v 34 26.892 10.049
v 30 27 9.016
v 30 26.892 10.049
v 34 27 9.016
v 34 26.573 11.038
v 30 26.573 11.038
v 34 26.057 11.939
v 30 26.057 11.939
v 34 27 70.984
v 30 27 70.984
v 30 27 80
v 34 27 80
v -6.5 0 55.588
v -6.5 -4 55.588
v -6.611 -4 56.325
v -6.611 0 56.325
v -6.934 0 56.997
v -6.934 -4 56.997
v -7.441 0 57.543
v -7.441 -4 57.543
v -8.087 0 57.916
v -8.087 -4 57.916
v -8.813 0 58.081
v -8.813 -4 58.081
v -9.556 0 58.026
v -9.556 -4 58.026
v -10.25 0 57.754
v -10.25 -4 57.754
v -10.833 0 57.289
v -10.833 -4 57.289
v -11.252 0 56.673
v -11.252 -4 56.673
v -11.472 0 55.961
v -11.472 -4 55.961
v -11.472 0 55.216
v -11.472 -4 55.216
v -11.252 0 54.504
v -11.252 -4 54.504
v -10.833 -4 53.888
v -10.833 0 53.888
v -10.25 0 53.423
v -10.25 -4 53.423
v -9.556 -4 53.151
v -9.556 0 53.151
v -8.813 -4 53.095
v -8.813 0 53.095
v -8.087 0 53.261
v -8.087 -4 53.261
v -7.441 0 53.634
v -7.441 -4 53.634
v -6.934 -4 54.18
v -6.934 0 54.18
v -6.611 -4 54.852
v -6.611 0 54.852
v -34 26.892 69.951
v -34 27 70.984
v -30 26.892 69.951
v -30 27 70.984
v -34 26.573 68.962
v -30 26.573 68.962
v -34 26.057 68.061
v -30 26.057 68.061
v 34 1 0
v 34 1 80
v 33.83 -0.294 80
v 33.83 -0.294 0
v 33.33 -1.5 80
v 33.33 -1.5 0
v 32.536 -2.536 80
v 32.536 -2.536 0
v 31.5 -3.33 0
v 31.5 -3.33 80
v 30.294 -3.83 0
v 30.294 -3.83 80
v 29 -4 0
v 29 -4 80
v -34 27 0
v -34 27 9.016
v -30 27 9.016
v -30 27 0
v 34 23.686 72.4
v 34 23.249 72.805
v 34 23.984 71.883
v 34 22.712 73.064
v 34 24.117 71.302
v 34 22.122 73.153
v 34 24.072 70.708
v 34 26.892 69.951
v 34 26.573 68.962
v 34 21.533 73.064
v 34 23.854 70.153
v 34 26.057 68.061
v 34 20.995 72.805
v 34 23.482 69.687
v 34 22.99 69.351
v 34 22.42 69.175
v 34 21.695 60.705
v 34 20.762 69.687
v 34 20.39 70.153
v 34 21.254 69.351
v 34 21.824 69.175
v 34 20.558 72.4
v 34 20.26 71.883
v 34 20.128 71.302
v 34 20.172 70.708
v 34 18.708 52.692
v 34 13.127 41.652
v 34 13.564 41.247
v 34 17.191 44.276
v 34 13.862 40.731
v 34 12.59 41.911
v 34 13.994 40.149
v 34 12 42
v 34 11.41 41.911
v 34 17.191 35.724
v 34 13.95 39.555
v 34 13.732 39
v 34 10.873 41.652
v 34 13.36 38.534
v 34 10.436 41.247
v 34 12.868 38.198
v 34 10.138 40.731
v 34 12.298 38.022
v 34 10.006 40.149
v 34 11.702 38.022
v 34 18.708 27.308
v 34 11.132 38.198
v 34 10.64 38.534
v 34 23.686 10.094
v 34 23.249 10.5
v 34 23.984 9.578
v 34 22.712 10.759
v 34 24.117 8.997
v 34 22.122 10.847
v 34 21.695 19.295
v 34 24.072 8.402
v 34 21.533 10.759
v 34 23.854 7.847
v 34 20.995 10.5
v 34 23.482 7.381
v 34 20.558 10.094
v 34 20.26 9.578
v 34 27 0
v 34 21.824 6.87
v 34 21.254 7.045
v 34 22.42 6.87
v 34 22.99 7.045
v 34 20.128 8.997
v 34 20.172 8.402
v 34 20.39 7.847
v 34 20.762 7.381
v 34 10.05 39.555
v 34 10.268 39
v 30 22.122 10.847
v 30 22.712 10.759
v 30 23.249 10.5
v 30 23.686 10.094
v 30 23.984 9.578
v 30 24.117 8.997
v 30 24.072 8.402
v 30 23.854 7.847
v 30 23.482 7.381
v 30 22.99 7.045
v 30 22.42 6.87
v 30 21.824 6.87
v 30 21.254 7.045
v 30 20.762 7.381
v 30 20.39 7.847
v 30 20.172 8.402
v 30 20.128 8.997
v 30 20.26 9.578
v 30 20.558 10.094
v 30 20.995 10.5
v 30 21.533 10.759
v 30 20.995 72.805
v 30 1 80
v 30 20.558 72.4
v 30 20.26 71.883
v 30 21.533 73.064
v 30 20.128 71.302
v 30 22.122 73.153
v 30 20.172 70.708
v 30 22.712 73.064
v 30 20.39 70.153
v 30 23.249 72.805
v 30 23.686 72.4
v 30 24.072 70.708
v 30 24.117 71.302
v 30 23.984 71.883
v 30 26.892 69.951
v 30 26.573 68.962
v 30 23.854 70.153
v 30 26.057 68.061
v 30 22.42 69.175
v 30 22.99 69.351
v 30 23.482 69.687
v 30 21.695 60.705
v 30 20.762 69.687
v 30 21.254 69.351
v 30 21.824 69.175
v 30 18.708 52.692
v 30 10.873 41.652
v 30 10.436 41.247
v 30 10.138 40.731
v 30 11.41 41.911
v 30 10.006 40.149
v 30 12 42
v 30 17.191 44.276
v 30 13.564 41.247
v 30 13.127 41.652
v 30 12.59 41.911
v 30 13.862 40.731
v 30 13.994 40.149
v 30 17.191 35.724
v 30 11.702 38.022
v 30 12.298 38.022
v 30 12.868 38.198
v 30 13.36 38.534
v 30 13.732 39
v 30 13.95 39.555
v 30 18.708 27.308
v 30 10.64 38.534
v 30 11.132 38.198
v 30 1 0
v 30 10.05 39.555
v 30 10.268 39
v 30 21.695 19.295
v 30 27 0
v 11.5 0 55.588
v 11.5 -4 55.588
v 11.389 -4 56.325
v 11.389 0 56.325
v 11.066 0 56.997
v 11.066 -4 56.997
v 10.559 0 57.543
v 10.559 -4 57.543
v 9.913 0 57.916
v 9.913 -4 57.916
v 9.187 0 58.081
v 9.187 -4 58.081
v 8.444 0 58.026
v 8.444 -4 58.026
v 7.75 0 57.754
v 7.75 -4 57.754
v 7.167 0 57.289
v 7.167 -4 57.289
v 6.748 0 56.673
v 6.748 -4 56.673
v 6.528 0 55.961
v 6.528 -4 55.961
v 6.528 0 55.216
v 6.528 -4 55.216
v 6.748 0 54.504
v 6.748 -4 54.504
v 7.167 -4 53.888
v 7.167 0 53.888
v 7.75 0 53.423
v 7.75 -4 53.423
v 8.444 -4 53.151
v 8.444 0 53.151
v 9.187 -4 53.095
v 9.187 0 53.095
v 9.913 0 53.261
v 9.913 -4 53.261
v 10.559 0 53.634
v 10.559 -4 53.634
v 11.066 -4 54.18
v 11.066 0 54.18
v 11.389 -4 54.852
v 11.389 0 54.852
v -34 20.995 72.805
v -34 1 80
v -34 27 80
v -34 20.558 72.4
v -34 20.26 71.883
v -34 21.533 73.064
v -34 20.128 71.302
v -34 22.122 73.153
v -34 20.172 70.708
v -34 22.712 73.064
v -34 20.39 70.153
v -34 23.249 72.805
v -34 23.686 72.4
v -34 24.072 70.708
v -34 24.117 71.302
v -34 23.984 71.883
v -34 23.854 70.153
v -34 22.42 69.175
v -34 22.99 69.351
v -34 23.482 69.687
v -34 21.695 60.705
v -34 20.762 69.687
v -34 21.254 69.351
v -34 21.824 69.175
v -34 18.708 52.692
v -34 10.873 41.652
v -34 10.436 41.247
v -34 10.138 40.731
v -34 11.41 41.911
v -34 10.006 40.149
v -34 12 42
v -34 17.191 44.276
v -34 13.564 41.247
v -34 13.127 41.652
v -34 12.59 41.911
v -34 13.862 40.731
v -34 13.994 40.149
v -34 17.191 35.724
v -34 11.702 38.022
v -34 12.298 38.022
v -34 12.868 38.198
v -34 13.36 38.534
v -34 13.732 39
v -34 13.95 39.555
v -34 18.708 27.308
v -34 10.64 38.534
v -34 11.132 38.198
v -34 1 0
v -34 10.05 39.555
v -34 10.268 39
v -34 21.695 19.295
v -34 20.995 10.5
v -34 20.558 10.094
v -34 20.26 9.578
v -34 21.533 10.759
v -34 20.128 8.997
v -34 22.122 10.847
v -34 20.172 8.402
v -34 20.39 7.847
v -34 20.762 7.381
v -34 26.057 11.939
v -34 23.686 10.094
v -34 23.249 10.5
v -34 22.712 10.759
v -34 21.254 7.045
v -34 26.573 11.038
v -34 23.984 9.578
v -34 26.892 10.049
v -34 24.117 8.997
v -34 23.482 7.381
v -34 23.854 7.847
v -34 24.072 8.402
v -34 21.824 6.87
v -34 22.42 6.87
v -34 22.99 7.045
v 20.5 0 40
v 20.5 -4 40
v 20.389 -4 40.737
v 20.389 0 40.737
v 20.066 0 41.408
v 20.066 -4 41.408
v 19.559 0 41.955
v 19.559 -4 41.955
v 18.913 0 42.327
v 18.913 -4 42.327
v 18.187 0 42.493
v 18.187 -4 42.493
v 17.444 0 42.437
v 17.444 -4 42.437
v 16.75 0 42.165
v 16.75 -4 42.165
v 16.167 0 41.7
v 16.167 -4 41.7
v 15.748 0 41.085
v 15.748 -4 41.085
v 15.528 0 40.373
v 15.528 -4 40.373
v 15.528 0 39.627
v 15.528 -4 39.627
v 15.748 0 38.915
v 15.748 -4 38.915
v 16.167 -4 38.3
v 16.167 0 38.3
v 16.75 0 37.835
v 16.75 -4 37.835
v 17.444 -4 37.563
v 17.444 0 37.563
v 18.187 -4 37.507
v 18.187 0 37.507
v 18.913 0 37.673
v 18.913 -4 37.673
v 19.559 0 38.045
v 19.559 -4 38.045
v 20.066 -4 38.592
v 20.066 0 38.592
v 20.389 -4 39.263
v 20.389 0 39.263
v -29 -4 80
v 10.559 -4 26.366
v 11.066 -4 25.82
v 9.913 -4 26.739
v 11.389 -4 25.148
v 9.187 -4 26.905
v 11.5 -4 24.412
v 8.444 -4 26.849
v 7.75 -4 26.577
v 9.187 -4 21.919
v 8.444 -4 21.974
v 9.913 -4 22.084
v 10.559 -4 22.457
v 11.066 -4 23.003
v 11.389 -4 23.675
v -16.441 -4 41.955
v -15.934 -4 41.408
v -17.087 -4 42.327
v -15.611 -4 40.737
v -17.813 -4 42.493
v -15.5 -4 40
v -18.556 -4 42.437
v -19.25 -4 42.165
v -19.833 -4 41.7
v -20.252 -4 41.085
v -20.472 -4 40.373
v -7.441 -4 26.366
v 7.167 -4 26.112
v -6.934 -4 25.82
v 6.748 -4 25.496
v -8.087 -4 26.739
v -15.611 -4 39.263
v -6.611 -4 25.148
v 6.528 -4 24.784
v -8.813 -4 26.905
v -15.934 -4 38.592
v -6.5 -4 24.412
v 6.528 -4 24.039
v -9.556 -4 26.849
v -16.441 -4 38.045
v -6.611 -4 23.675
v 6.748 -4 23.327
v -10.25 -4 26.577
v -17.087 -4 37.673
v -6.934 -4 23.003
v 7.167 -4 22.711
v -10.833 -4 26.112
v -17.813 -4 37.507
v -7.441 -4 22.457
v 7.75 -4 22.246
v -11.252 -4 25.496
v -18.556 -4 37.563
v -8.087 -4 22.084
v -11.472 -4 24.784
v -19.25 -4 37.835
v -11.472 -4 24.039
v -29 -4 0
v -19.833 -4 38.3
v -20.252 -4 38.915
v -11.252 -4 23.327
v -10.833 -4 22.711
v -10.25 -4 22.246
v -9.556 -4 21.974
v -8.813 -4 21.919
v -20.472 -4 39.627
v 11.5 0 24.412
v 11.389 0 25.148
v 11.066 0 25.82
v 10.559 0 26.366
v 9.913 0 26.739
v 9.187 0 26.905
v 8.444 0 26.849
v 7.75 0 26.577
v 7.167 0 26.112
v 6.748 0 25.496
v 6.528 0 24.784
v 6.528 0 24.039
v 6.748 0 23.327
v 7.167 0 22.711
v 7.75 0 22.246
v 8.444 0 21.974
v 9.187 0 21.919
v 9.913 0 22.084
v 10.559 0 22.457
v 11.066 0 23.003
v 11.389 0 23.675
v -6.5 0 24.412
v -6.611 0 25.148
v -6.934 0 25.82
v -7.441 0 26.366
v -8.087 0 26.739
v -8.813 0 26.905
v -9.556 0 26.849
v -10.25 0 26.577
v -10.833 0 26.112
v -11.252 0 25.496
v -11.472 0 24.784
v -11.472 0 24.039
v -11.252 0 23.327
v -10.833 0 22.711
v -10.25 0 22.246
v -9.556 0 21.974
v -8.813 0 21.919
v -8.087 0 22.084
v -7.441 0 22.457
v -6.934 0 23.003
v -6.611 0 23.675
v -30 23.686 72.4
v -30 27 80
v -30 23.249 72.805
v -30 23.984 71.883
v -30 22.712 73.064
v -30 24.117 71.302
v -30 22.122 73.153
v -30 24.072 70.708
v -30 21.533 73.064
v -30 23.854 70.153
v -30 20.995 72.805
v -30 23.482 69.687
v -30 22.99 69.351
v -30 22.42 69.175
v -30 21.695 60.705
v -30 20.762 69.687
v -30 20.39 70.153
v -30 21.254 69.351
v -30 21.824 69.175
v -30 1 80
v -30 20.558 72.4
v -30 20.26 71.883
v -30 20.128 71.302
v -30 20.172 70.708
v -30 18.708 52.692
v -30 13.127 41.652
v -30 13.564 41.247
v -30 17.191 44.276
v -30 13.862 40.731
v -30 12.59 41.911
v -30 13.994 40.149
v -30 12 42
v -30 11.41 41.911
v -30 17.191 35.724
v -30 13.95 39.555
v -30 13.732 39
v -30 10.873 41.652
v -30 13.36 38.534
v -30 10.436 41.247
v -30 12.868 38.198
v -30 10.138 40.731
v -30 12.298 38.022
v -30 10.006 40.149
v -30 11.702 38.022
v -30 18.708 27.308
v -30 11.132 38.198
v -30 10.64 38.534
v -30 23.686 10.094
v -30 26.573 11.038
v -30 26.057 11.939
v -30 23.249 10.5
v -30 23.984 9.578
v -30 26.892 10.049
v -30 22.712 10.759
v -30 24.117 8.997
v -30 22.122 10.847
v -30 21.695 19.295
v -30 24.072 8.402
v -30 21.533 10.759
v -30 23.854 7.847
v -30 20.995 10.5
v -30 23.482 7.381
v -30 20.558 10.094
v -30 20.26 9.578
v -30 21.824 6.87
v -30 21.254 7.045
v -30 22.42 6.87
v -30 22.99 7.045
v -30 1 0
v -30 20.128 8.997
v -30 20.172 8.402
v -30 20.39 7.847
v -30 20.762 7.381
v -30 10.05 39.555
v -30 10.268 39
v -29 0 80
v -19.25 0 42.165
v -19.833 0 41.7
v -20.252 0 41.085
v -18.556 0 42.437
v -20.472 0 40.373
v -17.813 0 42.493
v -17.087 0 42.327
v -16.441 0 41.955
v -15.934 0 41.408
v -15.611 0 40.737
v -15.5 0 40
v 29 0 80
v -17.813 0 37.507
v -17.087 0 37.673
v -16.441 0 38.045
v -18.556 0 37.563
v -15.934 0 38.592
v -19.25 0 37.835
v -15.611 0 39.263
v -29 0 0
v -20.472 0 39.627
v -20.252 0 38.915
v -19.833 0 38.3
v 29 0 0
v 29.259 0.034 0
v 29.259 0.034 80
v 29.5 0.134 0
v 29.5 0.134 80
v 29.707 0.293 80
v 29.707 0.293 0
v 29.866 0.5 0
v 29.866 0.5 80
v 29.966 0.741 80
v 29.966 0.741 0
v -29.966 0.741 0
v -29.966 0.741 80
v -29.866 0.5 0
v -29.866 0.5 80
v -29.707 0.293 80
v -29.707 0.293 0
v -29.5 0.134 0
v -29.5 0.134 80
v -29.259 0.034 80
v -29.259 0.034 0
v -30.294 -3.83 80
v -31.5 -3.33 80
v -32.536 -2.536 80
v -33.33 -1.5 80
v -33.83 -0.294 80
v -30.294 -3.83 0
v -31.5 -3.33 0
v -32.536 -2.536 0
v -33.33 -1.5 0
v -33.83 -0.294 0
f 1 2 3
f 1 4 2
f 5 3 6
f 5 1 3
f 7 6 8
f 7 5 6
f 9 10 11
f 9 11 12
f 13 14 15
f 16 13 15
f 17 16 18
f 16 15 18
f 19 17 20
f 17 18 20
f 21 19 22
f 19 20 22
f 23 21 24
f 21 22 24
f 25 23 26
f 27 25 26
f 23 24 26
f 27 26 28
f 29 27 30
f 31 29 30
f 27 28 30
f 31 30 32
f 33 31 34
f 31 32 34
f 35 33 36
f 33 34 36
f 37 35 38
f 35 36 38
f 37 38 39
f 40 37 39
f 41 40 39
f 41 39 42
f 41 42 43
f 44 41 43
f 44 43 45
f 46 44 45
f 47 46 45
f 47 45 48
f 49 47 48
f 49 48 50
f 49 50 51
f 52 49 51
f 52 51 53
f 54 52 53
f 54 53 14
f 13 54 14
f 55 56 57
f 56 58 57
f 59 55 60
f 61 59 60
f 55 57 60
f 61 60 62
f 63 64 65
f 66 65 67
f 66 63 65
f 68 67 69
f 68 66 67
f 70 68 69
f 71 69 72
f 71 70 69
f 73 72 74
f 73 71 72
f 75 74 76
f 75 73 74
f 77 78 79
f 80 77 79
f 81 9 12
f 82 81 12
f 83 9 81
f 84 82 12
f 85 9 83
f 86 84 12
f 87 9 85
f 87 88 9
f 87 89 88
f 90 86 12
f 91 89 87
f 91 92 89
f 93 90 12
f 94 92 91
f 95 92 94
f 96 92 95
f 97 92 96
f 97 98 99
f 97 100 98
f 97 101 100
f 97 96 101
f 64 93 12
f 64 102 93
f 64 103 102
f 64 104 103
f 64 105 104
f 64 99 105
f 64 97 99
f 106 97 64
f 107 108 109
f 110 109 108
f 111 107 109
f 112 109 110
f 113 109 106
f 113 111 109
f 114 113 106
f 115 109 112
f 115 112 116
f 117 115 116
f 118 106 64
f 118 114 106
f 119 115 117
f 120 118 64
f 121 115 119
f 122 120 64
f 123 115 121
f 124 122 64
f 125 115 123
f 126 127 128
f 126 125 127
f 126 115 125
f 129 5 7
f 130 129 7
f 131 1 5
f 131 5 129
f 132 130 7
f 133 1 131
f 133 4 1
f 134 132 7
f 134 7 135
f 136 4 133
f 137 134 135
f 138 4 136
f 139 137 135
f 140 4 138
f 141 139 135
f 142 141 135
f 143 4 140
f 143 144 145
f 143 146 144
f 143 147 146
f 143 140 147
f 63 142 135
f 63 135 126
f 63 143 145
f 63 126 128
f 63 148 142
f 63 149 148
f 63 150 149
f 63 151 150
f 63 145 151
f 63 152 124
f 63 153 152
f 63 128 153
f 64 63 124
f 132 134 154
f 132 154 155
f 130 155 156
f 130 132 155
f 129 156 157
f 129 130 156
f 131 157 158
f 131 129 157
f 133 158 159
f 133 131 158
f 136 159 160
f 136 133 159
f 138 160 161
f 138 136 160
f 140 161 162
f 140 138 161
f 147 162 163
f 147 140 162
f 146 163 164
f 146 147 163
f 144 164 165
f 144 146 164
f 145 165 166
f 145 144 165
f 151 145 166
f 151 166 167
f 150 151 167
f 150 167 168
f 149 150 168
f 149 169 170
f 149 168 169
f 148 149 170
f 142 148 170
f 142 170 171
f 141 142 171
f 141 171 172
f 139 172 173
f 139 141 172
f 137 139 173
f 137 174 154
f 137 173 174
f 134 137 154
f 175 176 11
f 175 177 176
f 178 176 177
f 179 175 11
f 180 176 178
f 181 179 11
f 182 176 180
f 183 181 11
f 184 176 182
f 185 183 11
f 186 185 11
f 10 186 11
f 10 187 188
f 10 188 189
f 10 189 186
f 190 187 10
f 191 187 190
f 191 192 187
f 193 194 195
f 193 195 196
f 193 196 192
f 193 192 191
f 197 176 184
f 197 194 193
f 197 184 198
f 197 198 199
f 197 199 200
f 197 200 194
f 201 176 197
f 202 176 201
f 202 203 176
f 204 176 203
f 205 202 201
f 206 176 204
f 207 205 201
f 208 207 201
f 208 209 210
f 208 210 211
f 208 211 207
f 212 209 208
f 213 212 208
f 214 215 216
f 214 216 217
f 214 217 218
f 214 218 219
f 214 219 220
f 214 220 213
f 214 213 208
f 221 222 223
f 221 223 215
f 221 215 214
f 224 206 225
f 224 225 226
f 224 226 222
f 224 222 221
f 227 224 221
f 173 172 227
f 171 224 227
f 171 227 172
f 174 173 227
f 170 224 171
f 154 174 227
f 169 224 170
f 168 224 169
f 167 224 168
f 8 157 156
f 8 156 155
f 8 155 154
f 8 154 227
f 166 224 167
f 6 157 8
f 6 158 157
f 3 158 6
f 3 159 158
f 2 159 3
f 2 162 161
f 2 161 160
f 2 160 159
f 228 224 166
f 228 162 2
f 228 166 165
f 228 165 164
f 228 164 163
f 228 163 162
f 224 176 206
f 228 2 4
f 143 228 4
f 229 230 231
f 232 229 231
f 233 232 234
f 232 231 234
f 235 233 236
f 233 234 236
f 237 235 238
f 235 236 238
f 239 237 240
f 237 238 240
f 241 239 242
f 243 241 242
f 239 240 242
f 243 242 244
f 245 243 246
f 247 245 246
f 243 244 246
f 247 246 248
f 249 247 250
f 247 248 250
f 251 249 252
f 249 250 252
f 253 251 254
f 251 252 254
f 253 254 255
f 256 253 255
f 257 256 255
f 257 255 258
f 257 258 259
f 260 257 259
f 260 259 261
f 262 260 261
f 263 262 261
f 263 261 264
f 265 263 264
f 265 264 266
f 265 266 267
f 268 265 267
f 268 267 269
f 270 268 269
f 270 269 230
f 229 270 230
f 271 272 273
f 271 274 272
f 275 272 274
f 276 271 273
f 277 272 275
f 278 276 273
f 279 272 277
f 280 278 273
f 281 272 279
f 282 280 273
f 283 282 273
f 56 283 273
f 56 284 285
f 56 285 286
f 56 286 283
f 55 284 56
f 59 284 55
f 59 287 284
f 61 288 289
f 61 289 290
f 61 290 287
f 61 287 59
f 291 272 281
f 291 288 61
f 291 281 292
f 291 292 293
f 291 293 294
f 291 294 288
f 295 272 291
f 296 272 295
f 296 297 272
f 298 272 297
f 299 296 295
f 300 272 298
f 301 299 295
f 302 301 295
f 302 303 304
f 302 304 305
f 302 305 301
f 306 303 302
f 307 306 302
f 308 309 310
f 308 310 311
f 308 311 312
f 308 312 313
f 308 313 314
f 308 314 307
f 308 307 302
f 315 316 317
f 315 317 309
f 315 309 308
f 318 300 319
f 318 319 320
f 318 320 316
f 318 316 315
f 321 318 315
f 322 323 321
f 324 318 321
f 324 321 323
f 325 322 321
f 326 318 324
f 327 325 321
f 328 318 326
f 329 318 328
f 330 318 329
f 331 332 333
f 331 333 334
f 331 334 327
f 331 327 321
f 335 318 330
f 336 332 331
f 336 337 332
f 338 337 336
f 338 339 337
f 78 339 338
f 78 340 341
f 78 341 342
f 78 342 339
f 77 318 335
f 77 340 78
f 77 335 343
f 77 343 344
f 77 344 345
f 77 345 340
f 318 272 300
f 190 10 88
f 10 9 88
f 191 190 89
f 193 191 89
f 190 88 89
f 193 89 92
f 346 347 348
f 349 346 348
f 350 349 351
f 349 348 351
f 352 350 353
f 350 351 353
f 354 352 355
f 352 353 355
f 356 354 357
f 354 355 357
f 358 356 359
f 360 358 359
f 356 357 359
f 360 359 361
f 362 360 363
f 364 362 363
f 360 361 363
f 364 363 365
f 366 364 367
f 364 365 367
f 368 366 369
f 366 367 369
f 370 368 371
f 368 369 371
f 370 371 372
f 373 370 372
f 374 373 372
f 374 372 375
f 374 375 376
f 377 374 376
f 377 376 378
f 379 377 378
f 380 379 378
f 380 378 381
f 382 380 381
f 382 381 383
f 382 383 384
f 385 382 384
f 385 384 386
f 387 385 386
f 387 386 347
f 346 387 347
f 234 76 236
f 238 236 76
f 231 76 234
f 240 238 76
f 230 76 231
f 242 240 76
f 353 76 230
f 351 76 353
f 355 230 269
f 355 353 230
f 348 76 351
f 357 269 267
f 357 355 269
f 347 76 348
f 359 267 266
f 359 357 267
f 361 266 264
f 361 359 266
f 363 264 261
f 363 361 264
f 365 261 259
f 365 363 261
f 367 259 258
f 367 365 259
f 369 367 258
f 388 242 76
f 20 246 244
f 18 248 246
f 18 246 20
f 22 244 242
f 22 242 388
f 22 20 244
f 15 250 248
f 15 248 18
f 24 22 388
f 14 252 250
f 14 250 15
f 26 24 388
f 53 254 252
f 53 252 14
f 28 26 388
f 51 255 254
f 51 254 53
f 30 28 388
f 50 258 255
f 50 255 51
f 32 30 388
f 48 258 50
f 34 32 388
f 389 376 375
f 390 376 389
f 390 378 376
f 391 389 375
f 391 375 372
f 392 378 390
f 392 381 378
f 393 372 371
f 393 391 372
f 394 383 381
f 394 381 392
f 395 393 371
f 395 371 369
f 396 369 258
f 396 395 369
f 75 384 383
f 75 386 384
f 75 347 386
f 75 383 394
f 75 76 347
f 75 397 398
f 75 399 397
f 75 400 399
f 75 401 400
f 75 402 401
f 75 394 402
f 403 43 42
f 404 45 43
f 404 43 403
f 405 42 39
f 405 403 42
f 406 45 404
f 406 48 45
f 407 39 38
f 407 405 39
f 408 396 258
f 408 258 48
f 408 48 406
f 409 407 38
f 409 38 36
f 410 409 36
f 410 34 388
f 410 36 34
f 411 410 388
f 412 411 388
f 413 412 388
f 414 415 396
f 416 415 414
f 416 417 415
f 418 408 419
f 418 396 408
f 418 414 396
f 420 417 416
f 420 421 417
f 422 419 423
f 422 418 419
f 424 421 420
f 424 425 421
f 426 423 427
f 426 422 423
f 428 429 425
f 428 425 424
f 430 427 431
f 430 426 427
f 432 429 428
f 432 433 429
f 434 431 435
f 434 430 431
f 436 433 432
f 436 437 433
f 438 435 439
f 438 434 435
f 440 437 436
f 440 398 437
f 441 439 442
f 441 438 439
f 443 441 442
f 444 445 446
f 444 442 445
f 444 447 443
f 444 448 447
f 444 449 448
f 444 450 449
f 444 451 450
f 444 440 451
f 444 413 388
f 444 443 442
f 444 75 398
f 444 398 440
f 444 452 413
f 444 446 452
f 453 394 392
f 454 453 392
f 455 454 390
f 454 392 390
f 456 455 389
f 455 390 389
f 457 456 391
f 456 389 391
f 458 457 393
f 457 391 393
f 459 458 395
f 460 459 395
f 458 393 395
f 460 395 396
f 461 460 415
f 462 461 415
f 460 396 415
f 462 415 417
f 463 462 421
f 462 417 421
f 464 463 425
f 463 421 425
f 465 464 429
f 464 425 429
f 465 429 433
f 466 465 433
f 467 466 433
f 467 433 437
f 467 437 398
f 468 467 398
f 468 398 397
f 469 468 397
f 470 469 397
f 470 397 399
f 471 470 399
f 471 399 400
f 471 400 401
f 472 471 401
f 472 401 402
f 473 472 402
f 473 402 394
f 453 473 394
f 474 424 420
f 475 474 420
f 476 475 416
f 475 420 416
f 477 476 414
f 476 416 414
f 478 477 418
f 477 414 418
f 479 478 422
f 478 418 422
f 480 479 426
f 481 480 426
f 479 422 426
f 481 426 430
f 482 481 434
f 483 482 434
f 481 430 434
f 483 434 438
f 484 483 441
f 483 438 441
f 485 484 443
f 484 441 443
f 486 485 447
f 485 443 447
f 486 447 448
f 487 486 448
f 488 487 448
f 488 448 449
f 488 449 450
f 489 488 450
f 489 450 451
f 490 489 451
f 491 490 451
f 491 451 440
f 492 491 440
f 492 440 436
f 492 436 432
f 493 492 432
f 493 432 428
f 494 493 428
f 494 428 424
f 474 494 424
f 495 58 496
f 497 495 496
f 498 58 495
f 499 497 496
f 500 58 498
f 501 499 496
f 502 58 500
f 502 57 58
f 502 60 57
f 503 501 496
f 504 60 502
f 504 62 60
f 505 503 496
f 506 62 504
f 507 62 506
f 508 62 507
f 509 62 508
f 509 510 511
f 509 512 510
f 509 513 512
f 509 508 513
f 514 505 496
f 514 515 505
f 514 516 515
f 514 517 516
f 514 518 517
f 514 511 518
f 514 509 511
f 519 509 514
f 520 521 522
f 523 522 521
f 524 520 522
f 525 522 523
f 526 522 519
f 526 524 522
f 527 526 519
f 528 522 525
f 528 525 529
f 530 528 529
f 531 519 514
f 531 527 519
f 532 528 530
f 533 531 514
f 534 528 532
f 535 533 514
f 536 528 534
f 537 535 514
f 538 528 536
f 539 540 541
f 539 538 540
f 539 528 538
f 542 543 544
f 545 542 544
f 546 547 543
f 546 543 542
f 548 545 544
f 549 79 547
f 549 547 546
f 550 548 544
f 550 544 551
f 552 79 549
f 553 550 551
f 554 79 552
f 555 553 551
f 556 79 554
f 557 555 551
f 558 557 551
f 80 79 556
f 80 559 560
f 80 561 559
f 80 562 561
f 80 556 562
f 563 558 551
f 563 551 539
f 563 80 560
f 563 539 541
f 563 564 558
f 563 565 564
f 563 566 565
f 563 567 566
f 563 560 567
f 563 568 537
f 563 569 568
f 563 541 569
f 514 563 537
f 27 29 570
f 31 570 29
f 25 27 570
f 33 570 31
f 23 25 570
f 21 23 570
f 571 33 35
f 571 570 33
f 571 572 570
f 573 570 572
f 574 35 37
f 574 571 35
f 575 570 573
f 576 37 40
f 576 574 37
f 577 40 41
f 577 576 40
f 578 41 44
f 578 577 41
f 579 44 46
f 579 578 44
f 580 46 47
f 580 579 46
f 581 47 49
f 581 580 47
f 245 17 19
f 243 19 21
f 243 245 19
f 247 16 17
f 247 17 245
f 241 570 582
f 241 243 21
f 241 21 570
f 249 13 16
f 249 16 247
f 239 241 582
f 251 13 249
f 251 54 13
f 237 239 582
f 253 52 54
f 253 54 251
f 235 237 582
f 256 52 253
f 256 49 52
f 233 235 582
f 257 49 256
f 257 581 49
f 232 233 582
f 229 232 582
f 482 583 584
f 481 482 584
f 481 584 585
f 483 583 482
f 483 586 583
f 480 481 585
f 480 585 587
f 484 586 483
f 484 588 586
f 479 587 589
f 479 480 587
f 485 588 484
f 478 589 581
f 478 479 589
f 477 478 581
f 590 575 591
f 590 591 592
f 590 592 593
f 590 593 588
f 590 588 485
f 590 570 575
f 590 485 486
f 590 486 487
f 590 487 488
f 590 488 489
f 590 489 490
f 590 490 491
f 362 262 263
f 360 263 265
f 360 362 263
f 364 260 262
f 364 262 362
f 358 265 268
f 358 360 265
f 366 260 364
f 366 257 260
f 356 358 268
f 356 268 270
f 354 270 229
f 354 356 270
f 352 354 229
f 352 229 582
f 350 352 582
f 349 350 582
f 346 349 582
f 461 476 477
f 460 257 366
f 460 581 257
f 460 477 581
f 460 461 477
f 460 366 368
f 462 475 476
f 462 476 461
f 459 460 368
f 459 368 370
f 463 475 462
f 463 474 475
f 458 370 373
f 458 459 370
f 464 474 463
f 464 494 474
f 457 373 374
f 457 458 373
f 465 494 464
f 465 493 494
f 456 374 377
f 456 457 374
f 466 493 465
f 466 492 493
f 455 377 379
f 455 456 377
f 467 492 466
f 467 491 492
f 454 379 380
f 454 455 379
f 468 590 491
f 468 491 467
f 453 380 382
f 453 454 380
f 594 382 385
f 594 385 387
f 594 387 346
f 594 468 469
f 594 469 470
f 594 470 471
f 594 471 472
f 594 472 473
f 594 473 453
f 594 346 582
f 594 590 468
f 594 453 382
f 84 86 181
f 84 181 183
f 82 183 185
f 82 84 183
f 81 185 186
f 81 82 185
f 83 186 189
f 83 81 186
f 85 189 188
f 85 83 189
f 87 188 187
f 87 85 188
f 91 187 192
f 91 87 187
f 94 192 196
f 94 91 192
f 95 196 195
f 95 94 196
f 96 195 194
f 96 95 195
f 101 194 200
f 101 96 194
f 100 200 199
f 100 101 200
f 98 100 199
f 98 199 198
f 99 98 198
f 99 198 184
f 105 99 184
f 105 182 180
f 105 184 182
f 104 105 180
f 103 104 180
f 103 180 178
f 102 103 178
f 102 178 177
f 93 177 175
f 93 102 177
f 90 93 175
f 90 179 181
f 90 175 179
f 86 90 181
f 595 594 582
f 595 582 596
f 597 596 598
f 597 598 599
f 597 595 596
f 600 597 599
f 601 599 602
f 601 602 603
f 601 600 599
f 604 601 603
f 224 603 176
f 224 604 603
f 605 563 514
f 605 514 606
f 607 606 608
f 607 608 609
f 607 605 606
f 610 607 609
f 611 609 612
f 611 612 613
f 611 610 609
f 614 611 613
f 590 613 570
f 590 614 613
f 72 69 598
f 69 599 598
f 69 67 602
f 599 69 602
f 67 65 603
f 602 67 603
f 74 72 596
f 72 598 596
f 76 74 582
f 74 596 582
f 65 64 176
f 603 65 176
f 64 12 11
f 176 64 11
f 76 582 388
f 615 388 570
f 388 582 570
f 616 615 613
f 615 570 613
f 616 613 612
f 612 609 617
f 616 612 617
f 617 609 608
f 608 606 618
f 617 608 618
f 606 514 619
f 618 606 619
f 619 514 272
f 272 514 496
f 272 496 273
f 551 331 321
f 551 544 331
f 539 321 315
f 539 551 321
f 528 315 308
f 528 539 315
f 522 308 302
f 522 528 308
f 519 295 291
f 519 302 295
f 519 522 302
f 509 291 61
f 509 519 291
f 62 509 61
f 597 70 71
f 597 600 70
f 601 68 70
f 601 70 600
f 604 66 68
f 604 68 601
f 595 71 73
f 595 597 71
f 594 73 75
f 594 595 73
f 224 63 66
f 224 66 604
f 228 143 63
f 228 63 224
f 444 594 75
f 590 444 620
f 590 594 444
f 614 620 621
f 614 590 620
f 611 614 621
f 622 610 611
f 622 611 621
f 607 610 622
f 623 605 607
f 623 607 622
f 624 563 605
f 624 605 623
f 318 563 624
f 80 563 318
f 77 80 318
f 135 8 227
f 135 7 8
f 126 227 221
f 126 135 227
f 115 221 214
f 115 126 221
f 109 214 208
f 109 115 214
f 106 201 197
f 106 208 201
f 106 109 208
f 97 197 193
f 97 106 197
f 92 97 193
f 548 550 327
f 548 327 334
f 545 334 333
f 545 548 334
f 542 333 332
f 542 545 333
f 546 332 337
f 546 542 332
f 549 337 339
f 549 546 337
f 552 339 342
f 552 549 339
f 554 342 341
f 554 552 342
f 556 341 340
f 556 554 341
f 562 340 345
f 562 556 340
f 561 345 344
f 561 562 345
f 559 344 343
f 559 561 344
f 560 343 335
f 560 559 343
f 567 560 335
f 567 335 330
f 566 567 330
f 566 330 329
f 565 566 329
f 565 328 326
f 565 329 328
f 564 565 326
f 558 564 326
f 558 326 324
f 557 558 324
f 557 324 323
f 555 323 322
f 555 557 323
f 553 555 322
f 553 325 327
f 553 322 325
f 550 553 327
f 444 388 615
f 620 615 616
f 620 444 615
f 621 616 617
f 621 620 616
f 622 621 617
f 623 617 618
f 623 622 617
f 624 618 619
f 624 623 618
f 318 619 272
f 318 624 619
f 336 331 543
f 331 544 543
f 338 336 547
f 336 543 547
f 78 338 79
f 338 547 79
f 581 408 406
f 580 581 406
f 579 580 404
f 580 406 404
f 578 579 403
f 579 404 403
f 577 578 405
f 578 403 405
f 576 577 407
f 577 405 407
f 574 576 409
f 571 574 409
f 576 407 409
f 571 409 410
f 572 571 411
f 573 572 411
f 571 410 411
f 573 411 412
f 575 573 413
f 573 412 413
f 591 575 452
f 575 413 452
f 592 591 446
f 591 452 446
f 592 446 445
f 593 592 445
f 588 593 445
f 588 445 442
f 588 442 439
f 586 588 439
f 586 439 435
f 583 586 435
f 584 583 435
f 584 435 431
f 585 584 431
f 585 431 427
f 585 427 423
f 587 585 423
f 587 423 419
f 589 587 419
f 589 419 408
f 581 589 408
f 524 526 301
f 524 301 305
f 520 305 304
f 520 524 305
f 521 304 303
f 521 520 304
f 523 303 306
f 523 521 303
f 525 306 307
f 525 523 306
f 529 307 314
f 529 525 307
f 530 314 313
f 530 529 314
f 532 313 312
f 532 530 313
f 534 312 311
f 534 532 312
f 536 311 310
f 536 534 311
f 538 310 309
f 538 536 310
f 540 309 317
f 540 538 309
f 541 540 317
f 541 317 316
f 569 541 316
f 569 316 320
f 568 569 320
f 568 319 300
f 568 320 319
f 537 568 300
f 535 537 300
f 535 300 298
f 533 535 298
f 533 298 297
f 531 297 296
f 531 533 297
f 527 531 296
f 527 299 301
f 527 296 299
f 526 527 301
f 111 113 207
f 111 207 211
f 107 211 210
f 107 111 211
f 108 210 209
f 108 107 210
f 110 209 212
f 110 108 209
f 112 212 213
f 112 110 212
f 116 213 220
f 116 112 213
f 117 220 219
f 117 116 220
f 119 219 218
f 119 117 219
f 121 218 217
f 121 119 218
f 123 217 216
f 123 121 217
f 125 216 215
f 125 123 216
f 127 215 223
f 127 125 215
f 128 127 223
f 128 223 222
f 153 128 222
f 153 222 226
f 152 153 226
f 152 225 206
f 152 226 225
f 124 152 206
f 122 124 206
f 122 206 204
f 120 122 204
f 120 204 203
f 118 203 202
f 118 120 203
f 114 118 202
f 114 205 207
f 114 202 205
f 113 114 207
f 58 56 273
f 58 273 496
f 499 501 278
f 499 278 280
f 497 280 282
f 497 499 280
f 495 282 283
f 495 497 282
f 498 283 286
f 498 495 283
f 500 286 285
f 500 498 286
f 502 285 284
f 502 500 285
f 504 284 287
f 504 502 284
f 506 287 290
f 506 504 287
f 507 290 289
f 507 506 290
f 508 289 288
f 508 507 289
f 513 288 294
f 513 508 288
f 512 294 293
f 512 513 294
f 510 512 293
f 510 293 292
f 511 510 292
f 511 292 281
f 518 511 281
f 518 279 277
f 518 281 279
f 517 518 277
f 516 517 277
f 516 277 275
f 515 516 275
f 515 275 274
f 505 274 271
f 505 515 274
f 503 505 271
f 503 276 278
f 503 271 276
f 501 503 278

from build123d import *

# Parameters (mm, degrees)
SM_BASE_FLANGE_1_DEPTH   = 80
CUT_EXTRUDE_3_DEPTH      = 109.411254028
CUT_EXTRUDE_3_DEPTH_BACK = 109.411254028
SKETCH_6_R               = 48
SKETCH_6_R_2             = 2
FILLET_1_R               = 5
SKETCH_9_R               = 2.5
CUT_EXTRUDE_4_DEPTH      = 93.287593966


# Sheet-metal steps are written as plain solids
with BuildPart() as part:
    # Sketch 1 → Базовая кромка1 (new body)
    with BuildSketch(Plane.XY):
        with BuildLine():
            Line((-30, 27), (-30, 1))
            ThreePointArc((-30, 1), (-29.707106781, 0.292893219), (-29, 0))
            Line((-29, 0), (29, 0))
            ThreePointArc((29, 0), (29.707106781, 0.292893219), (30, 1))
            Line((30, 1), (30, 27))
            Line((30, 27), (34, 27))
            Line((34, 27), (34, 1))
            ThreePointArc((34, 1), (32.535533906, -2.535533906), (29, -4))
            Line((29, -4), (-29, -4))
            ThreePointArc((-29, -4), (-32.535533906, -2.535533906), (-34, 1))
            Line((-34, 1), (-34, 27))
            Line((-34, 27), (-30, 27))
        make_face()
    extrude(amount=SM_BASE_FLANGE_1_DEPTH)

    # Эскиз6 → Вырез-Вытянуть3 (cut, two sides: drawn at the far end of the back side and taken through both)
    with BuildSketch(Plane.ZY.offset(34).offset(-CUT_EXTRUDE_3_DEPTH_BACK)):
        with Locations((40, 65)):
            Circle(SKETCH_6_R)
        with Locations((40, 12)):
            Circle(SKETCH_6_R_2)
        with Locations((8.847381628, 22.122099298)):
            Circle(SKETCH_6_R_2)
        with Locations((71.152618372, 22.122099298)):
            Circle(SKETCH_6_R_2)
    extrude(amount=CUT_EXTRUDE_3_DEPTH + CUT_EXTRUDE_3_DEPTH_BACK, mode=Mode.SUBTRACT)

    # Скругление1
    fillet_1_edges = [part.edges().sort_by_distance(p)[0] for p in [
        (32, 27, 10.674243403),
        (32, 27, 69.325756597),
        (-32, 27, 10.674243403),
        (-32, 27, 69.325756597),
    ]]
    fillet(fillet_1_edges, radius=FILLET_1_R)

    # Эскиз9 → Вырез-Вытянуть4 (cut, through all)
    with BuildSketch(Plane.XZ.offset(4)):
        with Locations((-18, 40)):
            Circle(SKETCH_9_R)
        with Locations((-9, 55.588457268)):
            Circle(SKETCH_9_R)
        with Locations((9, 55.588457268)):
            Circle(SKETCH_9_R)
        with Locations((18, 40)):
            Circle(SKETCH_9_R)
        with Locations((9, 24.411542732)):
            Circle(SKETCH_9_R)
        with Locations((-9, 24.411542732)):
            Circle(SKETCH_9_R)
    extrude(amount=-CUT_EXTRUDE_4_DEPTH, mode=Mode.SUBTRACT)


solid = part.part
